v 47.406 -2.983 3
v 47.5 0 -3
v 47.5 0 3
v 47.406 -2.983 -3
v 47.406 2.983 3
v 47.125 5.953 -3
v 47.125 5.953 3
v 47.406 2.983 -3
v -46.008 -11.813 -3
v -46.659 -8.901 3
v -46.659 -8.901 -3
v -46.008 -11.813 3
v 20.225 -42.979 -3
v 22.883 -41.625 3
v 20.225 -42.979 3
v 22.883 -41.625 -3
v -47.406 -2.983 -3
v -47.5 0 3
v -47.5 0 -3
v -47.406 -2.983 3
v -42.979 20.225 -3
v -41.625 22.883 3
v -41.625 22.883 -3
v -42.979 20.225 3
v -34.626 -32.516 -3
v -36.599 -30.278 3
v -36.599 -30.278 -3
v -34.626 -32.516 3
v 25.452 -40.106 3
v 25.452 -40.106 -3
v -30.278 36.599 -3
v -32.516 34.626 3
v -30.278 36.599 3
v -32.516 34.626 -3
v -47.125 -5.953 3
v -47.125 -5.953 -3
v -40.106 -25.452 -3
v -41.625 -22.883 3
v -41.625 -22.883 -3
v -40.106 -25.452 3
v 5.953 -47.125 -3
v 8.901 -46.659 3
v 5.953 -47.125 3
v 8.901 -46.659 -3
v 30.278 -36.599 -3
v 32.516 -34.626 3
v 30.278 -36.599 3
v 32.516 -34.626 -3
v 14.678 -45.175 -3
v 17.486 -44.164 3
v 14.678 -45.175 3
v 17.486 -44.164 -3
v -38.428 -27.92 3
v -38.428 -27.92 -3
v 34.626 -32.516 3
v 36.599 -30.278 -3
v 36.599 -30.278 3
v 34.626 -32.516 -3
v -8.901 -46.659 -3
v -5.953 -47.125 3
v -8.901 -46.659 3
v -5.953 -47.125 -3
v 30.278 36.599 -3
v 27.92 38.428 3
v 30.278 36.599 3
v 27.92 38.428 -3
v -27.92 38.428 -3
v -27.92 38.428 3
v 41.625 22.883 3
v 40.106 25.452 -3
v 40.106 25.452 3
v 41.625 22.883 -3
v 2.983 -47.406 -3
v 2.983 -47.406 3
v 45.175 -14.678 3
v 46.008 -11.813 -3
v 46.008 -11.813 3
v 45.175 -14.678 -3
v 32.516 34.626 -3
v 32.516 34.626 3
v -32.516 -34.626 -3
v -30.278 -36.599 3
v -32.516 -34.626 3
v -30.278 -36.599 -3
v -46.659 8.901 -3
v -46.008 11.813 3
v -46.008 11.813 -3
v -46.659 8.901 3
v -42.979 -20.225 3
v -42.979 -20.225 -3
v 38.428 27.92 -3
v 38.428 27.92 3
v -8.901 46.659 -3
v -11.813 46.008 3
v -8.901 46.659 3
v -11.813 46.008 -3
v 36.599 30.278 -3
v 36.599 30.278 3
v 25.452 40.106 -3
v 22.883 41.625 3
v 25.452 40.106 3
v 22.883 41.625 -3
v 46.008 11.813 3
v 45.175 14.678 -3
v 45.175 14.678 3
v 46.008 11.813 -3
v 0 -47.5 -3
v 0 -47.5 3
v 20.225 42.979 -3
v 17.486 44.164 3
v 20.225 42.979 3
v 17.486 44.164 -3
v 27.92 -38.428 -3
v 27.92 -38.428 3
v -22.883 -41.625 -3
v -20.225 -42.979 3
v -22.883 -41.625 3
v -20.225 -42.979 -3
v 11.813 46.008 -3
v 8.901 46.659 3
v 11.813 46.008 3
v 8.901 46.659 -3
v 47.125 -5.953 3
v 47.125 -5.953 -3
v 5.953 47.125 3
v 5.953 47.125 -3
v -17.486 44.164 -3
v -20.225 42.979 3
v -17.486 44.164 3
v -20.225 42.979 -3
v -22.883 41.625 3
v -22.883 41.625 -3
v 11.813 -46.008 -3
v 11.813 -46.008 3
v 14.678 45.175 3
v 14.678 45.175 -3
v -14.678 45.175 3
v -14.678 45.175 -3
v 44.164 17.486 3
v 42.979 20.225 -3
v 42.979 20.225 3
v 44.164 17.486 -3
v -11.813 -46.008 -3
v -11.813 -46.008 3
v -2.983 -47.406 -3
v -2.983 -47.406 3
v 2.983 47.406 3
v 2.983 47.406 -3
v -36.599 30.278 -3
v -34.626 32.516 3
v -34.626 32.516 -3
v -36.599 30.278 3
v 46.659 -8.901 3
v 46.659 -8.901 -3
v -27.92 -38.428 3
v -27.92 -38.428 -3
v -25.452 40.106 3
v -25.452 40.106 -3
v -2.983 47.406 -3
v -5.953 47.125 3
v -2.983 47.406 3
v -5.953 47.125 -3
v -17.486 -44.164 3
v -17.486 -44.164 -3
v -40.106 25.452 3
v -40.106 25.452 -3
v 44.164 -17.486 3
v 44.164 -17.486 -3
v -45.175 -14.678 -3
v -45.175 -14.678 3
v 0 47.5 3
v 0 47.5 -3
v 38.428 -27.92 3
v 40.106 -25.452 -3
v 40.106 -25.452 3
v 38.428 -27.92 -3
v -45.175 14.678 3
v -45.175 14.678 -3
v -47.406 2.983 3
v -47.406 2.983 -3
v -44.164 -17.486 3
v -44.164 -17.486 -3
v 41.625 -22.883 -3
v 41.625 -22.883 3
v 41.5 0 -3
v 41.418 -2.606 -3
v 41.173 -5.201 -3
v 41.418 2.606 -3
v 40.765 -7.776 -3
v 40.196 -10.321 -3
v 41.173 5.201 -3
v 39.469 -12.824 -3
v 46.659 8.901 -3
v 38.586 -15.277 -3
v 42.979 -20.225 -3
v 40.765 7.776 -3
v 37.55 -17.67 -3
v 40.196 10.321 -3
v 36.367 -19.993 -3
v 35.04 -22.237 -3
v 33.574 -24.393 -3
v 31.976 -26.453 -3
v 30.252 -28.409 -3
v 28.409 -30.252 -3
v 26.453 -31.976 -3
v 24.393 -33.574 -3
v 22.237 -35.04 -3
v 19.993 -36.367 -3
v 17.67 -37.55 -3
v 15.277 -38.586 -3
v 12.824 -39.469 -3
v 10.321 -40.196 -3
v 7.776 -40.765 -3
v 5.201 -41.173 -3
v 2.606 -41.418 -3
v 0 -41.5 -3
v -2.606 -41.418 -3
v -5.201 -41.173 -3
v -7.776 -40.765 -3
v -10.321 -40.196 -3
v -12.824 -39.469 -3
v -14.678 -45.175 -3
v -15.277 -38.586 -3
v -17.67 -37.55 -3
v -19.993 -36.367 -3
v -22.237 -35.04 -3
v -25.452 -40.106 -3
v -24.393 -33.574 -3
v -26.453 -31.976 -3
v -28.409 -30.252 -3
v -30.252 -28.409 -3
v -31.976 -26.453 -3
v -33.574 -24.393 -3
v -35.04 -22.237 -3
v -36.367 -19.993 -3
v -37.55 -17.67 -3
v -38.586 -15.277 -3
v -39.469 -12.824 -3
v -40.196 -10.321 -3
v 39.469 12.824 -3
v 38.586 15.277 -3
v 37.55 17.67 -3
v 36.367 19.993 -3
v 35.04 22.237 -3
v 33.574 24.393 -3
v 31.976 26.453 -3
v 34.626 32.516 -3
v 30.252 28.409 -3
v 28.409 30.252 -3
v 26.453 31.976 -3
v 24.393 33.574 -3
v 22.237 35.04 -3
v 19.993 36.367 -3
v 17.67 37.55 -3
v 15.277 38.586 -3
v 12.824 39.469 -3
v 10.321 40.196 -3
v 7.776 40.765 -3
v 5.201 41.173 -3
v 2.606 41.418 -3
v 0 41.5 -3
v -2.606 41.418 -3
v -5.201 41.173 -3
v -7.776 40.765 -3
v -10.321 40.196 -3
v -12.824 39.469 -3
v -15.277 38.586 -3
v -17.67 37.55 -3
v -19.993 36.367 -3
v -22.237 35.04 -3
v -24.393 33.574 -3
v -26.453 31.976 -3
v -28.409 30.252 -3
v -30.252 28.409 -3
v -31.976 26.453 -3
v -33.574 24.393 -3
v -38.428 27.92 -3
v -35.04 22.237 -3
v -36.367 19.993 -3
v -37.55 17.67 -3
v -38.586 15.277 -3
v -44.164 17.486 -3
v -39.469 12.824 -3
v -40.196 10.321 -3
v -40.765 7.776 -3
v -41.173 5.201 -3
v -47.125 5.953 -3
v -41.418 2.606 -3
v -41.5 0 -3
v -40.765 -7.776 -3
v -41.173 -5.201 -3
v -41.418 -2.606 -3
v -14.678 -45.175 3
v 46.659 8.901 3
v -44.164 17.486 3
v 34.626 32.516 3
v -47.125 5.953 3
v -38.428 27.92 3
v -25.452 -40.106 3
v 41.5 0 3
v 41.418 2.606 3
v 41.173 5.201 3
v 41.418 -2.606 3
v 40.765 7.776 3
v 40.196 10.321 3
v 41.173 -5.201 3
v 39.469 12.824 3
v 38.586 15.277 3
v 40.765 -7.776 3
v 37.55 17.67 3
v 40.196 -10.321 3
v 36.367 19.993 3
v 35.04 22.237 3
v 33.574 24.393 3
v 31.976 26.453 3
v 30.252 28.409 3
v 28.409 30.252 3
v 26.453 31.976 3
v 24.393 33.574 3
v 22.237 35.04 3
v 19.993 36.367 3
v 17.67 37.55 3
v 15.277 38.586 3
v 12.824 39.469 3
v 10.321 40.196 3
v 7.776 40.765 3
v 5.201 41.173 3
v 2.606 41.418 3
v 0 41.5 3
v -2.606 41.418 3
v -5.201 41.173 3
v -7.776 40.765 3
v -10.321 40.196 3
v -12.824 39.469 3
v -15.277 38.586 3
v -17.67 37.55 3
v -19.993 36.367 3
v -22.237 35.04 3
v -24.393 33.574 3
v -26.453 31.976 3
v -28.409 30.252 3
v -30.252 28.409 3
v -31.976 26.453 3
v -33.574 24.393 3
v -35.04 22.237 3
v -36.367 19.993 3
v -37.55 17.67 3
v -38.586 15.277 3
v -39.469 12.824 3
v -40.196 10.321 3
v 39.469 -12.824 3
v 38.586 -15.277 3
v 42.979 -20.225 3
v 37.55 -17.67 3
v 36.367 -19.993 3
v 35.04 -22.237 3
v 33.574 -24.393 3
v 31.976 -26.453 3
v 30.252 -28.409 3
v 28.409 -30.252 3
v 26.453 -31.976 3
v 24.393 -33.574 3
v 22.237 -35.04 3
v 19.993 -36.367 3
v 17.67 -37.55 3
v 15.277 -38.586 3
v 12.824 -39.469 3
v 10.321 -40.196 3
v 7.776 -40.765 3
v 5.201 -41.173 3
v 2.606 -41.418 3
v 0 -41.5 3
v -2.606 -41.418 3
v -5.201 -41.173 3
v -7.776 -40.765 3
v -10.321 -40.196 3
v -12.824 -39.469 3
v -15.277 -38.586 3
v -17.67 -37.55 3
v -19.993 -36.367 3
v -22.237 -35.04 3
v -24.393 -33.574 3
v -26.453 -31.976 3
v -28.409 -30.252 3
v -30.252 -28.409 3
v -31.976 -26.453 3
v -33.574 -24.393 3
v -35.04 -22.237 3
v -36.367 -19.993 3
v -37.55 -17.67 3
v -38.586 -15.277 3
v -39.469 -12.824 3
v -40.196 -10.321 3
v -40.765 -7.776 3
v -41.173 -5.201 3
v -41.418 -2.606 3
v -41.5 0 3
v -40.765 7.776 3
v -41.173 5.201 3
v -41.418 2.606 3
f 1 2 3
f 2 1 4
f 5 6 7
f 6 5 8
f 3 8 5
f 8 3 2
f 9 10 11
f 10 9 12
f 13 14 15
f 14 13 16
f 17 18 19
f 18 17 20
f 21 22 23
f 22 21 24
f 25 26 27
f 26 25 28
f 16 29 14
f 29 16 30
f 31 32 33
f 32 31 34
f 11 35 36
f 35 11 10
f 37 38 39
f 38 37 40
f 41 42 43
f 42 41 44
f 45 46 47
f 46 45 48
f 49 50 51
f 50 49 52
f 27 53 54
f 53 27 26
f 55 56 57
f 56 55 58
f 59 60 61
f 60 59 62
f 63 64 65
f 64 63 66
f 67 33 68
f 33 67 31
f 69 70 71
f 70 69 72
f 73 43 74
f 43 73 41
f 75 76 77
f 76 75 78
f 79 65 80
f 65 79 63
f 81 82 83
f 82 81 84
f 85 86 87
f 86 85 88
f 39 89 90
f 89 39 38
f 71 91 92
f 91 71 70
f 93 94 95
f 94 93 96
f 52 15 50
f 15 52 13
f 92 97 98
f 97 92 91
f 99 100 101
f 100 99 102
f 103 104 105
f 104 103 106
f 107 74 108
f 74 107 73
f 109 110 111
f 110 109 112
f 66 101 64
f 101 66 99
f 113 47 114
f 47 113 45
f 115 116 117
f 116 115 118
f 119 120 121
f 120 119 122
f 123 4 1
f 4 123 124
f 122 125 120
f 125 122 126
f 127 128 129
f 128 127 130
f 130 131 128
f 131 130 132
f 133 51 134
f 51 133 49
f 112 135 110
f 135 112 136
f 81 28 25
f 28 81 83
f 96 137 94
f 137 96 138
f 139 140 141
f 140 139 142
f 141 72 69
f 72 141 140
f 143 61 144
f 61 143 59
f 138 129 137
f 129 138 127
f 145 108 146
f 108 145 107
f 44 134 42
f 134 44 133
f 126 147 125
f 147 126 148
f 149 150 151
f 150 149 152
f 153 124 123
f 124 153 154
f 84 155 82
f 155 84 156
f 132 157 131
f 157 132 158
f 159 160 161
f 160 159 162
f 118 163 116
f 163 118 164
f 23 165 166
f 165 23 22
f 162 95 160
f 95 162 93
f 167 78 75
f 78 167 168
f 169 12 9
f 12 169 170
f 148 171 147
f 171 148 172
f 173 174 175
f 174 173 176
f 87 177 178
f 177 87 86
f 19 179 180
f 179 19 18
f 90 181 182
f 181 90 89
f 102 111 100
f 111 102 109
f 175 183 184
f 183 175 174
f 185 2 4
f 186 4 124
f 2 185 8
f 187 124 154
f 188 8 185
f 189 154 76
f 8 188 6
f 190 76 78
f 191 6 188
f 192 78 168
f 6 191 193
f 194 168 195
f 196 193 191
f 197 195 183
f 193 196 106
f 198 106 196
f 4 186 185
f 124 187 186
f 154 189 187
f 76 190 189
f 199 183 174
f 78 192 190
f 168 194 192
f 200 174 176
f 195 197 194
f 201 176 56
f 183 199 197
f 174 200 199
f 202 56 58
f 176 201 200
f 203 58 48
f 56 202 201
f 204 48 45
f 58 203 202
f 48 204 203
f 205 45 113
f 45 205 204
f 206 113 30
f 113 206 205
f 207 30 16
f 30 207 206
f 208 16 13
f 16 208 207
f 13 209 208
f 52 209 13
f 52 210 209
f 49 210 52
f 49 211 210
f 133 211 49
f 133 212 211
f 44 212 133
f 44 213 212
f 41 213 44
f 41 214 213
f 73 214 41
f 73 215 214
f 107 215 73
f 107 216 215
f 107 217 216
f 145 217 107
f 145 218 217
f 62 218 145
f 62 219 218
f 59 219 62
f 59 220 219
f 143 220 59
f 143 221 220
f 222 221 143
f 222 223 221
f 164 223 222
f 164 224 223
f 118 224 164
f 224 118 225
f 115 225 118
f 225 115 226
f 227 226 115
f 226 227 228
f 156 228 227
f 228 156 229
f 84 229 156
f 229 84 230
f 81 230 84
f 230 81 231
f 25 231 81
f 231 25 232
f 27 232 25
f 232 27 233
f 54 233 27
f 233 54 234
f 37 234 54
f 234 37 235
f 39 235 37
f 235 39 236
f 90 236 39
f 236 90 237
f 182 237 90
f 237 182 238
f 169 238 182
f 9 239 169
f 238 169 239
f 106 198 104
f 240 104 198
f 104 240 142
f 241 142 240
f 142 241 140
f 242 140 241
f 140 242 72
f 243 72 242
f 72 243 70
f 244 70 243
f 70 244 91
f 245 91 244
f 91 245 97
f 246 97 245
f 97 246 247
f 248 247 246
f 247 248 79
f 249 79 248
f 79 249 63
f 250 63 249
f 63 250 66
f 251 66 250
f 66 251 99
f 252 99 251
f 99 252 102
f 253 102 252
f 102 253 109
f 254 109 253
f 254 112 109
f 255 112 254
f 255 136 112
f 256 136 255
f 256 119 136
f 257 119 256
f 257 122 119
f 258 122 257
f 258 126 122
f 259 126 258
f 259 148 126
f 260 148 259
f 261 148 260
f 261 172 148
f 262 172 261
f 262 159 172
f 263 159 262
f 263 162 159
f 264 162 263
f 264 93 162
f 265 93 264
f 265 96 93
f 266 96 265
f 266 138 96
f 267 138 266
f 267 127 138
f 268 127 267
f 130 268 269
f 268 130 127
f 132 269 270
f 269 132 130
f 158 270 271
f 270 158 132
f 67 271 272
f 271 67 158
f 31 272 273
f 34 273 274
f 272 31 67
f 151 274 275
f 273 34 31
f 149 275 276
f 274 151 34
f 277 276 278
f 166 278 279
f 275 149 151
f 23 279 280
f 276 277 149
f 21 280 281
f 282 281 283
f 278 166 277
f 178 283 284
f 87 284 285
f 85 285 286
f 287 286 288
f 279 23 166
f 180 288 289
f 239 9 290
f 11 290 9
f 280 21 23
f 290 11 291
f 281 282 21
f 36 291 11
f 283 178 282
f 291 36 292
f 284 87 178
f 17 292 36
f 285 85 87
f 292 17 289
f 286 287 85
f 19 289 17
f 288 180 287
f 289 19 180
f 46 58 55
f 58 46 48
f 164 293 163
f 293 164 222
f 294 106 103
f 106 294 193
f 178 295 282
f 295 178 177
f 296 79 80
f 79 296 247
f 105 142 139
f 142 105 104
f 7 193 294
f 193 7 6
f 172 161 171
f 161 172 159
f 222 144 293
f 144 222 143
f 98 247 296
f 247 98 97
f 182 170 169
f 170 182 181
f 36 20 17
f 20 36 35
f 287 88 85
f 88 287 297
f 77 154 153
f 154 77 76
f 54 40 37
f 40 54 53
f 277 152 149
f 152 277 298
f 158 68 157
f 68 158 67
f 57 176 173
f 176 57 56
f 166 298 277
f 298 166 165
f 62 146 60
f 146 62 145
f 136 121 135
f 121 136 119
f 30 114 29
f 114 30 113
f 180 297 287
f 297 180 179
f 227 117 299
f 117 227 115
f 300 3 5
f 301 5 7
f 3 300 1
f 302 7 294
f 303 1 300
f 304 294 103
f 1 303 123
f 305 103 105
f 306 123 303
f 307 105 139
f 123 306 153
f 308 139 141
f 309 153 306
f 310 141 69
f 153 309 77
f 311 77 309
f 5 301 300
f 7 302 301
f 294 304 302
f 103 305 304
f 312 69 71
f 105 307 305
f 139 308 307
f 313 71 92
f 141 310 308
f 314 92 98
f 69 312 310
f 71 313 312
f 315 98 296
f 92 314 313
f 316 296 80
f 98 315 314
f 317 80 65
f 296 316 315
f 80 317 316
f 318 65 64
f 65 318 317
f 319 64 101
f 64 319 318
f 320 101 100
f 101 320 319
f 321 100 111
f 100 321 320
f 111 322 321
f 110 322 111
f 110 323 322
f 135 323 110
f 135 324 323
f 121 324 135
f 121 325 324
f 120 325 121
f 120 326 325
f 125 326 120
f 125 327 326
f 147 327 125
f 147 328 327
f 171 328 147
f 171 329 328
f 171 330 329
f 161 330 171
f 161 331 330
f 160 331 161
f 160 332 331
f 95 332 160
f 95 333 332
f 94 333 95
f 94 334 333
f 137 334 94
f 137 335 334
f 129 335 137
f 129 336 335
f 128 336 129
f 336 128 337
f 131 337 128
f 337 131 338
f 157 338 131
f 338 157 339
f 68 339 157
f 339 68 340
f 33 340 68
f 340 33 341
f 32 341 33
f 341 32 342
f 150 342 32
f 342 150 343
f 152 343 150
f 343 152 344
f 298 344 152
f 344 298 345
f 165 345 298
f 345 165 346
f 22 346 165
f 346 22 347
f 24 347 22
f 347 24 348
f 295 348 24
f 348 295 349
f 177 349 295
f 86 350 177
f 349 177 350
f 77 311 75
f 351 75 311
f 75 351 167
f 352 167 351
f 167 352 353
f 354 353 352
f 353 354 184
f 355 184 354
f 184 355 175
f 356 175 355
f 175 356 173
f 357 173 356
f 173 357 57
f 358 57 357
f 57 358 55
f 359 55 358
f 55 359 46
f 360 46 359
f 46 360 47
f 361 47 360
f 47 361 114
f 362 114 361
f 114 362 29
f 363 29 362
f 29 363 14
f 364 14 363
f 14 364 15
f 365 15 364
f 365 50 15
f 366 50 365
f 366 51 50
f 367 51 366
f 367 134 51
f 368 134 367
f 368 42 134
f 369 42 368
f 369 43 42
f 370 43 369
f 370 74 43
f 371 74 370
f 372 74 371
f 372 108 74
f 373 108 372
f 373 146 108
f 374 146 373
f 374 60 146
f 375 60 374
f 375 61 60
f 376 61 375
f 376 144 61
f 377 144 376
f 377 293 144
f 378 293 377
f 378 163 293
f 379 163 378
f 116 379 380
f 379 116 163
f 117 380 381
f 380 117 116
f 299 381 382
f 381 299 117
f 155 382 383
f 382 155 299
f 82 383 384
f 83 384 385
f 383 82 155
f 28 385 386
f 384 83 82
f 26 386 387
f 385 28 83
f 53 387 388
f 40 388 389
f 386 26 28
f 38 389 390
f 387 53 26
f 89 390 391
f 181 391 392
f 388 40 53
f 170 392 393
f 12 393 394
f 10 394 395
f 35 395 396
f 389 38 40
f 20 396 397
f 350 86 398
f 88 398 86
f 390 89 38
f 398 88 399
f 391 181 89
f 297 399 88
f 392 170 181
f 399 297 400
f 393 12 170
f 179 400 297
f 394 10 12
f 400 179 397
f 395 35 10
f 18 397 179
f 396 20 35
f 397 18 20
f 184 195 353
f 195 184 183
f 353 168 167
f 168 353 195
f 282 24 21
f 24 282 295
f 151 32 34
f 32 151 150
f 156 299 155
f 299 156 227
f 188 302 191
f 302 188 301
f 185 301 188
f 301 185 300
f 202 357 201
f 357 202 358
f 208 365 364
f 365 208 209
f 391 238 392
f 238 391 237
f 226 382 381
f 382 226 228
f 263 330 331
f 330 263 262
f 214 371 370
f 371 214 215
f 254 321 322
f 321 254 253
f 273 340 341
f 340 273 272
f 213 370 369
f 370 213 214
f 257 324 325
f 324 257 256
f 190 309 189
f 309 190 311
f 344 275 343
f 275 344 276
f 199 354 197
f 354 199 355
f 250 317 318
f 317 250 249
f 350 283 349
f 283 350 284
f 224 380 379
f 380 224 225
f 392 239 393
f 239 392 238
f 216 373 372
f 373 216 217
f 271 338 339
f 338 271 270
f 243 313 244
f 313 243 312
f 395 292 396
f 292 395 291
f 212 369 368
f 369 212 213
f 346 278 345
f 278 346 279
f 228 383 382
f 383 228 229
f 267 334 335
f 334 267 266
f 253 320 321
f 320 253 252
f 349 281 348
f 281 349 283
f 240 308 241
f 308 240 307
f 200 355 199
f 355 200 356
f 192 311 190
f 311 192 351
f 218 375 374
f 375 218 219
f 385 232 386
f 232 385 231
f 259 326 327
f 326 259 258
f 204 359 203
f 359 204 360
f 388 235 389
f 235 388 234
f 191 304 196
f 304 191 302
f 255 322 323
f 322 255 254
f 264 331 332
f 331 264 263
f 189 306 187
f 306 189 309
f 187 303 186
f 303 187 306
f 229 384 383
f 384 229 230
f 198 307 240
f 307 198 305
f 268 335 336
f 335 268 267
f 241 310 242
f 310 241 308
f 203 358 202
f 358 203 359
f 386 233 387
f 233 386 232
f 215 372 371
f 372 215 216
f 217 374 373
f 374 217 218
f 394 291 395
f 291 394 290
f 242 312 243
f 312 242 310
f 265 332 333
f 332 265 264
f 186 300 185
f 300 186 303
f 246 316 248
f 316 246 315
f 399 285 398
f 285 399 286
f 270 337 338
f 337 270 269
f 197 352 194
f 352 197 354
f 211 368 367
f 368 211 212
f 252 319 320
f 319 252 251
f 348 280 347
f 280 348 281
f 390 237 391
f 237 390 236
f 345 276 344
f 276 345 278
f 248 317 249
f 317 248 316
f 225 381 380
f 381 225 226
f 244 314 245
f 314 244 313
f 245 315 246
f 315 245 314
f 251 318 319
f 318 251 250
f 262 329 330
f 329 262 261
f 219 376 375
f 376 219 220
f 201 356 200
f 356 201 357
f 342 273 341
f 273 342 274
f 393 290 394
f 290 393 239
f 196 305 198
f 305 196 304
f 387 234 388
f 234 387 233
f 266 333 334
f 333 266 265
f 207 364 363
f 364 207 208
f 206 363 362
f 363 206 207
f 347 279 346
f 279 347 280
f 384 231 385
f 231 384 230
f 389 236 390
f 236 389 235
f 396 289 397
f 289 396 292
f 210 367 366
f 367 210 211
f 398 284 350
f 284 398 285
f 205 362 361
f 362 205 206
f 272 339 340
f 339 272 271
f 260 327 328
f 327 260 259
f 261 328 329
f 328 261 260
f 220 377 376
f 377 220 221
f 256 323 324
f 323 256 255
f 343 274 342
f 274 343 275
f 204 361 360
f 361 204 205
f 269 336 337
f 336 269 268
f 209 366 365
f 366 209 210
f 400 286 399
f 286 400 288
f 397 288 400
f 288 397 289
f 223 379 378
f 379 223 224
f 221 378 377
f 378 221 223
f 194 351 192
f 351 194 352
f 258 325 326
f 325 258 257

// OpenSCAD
Resolution = 100;
RollingPin_Diameter = 47.5;
Ring_Width = 6;
Ring_Thickness = 6;

$fn = Resolution;
difference(){
    cylinder(h = Ring_Width, r = RollingPin_Diameter, center = true);
    cylinder(h = Ring_Width+1, r = (RollingPin_Diameter - Ring_Thickness), center = true);
}
